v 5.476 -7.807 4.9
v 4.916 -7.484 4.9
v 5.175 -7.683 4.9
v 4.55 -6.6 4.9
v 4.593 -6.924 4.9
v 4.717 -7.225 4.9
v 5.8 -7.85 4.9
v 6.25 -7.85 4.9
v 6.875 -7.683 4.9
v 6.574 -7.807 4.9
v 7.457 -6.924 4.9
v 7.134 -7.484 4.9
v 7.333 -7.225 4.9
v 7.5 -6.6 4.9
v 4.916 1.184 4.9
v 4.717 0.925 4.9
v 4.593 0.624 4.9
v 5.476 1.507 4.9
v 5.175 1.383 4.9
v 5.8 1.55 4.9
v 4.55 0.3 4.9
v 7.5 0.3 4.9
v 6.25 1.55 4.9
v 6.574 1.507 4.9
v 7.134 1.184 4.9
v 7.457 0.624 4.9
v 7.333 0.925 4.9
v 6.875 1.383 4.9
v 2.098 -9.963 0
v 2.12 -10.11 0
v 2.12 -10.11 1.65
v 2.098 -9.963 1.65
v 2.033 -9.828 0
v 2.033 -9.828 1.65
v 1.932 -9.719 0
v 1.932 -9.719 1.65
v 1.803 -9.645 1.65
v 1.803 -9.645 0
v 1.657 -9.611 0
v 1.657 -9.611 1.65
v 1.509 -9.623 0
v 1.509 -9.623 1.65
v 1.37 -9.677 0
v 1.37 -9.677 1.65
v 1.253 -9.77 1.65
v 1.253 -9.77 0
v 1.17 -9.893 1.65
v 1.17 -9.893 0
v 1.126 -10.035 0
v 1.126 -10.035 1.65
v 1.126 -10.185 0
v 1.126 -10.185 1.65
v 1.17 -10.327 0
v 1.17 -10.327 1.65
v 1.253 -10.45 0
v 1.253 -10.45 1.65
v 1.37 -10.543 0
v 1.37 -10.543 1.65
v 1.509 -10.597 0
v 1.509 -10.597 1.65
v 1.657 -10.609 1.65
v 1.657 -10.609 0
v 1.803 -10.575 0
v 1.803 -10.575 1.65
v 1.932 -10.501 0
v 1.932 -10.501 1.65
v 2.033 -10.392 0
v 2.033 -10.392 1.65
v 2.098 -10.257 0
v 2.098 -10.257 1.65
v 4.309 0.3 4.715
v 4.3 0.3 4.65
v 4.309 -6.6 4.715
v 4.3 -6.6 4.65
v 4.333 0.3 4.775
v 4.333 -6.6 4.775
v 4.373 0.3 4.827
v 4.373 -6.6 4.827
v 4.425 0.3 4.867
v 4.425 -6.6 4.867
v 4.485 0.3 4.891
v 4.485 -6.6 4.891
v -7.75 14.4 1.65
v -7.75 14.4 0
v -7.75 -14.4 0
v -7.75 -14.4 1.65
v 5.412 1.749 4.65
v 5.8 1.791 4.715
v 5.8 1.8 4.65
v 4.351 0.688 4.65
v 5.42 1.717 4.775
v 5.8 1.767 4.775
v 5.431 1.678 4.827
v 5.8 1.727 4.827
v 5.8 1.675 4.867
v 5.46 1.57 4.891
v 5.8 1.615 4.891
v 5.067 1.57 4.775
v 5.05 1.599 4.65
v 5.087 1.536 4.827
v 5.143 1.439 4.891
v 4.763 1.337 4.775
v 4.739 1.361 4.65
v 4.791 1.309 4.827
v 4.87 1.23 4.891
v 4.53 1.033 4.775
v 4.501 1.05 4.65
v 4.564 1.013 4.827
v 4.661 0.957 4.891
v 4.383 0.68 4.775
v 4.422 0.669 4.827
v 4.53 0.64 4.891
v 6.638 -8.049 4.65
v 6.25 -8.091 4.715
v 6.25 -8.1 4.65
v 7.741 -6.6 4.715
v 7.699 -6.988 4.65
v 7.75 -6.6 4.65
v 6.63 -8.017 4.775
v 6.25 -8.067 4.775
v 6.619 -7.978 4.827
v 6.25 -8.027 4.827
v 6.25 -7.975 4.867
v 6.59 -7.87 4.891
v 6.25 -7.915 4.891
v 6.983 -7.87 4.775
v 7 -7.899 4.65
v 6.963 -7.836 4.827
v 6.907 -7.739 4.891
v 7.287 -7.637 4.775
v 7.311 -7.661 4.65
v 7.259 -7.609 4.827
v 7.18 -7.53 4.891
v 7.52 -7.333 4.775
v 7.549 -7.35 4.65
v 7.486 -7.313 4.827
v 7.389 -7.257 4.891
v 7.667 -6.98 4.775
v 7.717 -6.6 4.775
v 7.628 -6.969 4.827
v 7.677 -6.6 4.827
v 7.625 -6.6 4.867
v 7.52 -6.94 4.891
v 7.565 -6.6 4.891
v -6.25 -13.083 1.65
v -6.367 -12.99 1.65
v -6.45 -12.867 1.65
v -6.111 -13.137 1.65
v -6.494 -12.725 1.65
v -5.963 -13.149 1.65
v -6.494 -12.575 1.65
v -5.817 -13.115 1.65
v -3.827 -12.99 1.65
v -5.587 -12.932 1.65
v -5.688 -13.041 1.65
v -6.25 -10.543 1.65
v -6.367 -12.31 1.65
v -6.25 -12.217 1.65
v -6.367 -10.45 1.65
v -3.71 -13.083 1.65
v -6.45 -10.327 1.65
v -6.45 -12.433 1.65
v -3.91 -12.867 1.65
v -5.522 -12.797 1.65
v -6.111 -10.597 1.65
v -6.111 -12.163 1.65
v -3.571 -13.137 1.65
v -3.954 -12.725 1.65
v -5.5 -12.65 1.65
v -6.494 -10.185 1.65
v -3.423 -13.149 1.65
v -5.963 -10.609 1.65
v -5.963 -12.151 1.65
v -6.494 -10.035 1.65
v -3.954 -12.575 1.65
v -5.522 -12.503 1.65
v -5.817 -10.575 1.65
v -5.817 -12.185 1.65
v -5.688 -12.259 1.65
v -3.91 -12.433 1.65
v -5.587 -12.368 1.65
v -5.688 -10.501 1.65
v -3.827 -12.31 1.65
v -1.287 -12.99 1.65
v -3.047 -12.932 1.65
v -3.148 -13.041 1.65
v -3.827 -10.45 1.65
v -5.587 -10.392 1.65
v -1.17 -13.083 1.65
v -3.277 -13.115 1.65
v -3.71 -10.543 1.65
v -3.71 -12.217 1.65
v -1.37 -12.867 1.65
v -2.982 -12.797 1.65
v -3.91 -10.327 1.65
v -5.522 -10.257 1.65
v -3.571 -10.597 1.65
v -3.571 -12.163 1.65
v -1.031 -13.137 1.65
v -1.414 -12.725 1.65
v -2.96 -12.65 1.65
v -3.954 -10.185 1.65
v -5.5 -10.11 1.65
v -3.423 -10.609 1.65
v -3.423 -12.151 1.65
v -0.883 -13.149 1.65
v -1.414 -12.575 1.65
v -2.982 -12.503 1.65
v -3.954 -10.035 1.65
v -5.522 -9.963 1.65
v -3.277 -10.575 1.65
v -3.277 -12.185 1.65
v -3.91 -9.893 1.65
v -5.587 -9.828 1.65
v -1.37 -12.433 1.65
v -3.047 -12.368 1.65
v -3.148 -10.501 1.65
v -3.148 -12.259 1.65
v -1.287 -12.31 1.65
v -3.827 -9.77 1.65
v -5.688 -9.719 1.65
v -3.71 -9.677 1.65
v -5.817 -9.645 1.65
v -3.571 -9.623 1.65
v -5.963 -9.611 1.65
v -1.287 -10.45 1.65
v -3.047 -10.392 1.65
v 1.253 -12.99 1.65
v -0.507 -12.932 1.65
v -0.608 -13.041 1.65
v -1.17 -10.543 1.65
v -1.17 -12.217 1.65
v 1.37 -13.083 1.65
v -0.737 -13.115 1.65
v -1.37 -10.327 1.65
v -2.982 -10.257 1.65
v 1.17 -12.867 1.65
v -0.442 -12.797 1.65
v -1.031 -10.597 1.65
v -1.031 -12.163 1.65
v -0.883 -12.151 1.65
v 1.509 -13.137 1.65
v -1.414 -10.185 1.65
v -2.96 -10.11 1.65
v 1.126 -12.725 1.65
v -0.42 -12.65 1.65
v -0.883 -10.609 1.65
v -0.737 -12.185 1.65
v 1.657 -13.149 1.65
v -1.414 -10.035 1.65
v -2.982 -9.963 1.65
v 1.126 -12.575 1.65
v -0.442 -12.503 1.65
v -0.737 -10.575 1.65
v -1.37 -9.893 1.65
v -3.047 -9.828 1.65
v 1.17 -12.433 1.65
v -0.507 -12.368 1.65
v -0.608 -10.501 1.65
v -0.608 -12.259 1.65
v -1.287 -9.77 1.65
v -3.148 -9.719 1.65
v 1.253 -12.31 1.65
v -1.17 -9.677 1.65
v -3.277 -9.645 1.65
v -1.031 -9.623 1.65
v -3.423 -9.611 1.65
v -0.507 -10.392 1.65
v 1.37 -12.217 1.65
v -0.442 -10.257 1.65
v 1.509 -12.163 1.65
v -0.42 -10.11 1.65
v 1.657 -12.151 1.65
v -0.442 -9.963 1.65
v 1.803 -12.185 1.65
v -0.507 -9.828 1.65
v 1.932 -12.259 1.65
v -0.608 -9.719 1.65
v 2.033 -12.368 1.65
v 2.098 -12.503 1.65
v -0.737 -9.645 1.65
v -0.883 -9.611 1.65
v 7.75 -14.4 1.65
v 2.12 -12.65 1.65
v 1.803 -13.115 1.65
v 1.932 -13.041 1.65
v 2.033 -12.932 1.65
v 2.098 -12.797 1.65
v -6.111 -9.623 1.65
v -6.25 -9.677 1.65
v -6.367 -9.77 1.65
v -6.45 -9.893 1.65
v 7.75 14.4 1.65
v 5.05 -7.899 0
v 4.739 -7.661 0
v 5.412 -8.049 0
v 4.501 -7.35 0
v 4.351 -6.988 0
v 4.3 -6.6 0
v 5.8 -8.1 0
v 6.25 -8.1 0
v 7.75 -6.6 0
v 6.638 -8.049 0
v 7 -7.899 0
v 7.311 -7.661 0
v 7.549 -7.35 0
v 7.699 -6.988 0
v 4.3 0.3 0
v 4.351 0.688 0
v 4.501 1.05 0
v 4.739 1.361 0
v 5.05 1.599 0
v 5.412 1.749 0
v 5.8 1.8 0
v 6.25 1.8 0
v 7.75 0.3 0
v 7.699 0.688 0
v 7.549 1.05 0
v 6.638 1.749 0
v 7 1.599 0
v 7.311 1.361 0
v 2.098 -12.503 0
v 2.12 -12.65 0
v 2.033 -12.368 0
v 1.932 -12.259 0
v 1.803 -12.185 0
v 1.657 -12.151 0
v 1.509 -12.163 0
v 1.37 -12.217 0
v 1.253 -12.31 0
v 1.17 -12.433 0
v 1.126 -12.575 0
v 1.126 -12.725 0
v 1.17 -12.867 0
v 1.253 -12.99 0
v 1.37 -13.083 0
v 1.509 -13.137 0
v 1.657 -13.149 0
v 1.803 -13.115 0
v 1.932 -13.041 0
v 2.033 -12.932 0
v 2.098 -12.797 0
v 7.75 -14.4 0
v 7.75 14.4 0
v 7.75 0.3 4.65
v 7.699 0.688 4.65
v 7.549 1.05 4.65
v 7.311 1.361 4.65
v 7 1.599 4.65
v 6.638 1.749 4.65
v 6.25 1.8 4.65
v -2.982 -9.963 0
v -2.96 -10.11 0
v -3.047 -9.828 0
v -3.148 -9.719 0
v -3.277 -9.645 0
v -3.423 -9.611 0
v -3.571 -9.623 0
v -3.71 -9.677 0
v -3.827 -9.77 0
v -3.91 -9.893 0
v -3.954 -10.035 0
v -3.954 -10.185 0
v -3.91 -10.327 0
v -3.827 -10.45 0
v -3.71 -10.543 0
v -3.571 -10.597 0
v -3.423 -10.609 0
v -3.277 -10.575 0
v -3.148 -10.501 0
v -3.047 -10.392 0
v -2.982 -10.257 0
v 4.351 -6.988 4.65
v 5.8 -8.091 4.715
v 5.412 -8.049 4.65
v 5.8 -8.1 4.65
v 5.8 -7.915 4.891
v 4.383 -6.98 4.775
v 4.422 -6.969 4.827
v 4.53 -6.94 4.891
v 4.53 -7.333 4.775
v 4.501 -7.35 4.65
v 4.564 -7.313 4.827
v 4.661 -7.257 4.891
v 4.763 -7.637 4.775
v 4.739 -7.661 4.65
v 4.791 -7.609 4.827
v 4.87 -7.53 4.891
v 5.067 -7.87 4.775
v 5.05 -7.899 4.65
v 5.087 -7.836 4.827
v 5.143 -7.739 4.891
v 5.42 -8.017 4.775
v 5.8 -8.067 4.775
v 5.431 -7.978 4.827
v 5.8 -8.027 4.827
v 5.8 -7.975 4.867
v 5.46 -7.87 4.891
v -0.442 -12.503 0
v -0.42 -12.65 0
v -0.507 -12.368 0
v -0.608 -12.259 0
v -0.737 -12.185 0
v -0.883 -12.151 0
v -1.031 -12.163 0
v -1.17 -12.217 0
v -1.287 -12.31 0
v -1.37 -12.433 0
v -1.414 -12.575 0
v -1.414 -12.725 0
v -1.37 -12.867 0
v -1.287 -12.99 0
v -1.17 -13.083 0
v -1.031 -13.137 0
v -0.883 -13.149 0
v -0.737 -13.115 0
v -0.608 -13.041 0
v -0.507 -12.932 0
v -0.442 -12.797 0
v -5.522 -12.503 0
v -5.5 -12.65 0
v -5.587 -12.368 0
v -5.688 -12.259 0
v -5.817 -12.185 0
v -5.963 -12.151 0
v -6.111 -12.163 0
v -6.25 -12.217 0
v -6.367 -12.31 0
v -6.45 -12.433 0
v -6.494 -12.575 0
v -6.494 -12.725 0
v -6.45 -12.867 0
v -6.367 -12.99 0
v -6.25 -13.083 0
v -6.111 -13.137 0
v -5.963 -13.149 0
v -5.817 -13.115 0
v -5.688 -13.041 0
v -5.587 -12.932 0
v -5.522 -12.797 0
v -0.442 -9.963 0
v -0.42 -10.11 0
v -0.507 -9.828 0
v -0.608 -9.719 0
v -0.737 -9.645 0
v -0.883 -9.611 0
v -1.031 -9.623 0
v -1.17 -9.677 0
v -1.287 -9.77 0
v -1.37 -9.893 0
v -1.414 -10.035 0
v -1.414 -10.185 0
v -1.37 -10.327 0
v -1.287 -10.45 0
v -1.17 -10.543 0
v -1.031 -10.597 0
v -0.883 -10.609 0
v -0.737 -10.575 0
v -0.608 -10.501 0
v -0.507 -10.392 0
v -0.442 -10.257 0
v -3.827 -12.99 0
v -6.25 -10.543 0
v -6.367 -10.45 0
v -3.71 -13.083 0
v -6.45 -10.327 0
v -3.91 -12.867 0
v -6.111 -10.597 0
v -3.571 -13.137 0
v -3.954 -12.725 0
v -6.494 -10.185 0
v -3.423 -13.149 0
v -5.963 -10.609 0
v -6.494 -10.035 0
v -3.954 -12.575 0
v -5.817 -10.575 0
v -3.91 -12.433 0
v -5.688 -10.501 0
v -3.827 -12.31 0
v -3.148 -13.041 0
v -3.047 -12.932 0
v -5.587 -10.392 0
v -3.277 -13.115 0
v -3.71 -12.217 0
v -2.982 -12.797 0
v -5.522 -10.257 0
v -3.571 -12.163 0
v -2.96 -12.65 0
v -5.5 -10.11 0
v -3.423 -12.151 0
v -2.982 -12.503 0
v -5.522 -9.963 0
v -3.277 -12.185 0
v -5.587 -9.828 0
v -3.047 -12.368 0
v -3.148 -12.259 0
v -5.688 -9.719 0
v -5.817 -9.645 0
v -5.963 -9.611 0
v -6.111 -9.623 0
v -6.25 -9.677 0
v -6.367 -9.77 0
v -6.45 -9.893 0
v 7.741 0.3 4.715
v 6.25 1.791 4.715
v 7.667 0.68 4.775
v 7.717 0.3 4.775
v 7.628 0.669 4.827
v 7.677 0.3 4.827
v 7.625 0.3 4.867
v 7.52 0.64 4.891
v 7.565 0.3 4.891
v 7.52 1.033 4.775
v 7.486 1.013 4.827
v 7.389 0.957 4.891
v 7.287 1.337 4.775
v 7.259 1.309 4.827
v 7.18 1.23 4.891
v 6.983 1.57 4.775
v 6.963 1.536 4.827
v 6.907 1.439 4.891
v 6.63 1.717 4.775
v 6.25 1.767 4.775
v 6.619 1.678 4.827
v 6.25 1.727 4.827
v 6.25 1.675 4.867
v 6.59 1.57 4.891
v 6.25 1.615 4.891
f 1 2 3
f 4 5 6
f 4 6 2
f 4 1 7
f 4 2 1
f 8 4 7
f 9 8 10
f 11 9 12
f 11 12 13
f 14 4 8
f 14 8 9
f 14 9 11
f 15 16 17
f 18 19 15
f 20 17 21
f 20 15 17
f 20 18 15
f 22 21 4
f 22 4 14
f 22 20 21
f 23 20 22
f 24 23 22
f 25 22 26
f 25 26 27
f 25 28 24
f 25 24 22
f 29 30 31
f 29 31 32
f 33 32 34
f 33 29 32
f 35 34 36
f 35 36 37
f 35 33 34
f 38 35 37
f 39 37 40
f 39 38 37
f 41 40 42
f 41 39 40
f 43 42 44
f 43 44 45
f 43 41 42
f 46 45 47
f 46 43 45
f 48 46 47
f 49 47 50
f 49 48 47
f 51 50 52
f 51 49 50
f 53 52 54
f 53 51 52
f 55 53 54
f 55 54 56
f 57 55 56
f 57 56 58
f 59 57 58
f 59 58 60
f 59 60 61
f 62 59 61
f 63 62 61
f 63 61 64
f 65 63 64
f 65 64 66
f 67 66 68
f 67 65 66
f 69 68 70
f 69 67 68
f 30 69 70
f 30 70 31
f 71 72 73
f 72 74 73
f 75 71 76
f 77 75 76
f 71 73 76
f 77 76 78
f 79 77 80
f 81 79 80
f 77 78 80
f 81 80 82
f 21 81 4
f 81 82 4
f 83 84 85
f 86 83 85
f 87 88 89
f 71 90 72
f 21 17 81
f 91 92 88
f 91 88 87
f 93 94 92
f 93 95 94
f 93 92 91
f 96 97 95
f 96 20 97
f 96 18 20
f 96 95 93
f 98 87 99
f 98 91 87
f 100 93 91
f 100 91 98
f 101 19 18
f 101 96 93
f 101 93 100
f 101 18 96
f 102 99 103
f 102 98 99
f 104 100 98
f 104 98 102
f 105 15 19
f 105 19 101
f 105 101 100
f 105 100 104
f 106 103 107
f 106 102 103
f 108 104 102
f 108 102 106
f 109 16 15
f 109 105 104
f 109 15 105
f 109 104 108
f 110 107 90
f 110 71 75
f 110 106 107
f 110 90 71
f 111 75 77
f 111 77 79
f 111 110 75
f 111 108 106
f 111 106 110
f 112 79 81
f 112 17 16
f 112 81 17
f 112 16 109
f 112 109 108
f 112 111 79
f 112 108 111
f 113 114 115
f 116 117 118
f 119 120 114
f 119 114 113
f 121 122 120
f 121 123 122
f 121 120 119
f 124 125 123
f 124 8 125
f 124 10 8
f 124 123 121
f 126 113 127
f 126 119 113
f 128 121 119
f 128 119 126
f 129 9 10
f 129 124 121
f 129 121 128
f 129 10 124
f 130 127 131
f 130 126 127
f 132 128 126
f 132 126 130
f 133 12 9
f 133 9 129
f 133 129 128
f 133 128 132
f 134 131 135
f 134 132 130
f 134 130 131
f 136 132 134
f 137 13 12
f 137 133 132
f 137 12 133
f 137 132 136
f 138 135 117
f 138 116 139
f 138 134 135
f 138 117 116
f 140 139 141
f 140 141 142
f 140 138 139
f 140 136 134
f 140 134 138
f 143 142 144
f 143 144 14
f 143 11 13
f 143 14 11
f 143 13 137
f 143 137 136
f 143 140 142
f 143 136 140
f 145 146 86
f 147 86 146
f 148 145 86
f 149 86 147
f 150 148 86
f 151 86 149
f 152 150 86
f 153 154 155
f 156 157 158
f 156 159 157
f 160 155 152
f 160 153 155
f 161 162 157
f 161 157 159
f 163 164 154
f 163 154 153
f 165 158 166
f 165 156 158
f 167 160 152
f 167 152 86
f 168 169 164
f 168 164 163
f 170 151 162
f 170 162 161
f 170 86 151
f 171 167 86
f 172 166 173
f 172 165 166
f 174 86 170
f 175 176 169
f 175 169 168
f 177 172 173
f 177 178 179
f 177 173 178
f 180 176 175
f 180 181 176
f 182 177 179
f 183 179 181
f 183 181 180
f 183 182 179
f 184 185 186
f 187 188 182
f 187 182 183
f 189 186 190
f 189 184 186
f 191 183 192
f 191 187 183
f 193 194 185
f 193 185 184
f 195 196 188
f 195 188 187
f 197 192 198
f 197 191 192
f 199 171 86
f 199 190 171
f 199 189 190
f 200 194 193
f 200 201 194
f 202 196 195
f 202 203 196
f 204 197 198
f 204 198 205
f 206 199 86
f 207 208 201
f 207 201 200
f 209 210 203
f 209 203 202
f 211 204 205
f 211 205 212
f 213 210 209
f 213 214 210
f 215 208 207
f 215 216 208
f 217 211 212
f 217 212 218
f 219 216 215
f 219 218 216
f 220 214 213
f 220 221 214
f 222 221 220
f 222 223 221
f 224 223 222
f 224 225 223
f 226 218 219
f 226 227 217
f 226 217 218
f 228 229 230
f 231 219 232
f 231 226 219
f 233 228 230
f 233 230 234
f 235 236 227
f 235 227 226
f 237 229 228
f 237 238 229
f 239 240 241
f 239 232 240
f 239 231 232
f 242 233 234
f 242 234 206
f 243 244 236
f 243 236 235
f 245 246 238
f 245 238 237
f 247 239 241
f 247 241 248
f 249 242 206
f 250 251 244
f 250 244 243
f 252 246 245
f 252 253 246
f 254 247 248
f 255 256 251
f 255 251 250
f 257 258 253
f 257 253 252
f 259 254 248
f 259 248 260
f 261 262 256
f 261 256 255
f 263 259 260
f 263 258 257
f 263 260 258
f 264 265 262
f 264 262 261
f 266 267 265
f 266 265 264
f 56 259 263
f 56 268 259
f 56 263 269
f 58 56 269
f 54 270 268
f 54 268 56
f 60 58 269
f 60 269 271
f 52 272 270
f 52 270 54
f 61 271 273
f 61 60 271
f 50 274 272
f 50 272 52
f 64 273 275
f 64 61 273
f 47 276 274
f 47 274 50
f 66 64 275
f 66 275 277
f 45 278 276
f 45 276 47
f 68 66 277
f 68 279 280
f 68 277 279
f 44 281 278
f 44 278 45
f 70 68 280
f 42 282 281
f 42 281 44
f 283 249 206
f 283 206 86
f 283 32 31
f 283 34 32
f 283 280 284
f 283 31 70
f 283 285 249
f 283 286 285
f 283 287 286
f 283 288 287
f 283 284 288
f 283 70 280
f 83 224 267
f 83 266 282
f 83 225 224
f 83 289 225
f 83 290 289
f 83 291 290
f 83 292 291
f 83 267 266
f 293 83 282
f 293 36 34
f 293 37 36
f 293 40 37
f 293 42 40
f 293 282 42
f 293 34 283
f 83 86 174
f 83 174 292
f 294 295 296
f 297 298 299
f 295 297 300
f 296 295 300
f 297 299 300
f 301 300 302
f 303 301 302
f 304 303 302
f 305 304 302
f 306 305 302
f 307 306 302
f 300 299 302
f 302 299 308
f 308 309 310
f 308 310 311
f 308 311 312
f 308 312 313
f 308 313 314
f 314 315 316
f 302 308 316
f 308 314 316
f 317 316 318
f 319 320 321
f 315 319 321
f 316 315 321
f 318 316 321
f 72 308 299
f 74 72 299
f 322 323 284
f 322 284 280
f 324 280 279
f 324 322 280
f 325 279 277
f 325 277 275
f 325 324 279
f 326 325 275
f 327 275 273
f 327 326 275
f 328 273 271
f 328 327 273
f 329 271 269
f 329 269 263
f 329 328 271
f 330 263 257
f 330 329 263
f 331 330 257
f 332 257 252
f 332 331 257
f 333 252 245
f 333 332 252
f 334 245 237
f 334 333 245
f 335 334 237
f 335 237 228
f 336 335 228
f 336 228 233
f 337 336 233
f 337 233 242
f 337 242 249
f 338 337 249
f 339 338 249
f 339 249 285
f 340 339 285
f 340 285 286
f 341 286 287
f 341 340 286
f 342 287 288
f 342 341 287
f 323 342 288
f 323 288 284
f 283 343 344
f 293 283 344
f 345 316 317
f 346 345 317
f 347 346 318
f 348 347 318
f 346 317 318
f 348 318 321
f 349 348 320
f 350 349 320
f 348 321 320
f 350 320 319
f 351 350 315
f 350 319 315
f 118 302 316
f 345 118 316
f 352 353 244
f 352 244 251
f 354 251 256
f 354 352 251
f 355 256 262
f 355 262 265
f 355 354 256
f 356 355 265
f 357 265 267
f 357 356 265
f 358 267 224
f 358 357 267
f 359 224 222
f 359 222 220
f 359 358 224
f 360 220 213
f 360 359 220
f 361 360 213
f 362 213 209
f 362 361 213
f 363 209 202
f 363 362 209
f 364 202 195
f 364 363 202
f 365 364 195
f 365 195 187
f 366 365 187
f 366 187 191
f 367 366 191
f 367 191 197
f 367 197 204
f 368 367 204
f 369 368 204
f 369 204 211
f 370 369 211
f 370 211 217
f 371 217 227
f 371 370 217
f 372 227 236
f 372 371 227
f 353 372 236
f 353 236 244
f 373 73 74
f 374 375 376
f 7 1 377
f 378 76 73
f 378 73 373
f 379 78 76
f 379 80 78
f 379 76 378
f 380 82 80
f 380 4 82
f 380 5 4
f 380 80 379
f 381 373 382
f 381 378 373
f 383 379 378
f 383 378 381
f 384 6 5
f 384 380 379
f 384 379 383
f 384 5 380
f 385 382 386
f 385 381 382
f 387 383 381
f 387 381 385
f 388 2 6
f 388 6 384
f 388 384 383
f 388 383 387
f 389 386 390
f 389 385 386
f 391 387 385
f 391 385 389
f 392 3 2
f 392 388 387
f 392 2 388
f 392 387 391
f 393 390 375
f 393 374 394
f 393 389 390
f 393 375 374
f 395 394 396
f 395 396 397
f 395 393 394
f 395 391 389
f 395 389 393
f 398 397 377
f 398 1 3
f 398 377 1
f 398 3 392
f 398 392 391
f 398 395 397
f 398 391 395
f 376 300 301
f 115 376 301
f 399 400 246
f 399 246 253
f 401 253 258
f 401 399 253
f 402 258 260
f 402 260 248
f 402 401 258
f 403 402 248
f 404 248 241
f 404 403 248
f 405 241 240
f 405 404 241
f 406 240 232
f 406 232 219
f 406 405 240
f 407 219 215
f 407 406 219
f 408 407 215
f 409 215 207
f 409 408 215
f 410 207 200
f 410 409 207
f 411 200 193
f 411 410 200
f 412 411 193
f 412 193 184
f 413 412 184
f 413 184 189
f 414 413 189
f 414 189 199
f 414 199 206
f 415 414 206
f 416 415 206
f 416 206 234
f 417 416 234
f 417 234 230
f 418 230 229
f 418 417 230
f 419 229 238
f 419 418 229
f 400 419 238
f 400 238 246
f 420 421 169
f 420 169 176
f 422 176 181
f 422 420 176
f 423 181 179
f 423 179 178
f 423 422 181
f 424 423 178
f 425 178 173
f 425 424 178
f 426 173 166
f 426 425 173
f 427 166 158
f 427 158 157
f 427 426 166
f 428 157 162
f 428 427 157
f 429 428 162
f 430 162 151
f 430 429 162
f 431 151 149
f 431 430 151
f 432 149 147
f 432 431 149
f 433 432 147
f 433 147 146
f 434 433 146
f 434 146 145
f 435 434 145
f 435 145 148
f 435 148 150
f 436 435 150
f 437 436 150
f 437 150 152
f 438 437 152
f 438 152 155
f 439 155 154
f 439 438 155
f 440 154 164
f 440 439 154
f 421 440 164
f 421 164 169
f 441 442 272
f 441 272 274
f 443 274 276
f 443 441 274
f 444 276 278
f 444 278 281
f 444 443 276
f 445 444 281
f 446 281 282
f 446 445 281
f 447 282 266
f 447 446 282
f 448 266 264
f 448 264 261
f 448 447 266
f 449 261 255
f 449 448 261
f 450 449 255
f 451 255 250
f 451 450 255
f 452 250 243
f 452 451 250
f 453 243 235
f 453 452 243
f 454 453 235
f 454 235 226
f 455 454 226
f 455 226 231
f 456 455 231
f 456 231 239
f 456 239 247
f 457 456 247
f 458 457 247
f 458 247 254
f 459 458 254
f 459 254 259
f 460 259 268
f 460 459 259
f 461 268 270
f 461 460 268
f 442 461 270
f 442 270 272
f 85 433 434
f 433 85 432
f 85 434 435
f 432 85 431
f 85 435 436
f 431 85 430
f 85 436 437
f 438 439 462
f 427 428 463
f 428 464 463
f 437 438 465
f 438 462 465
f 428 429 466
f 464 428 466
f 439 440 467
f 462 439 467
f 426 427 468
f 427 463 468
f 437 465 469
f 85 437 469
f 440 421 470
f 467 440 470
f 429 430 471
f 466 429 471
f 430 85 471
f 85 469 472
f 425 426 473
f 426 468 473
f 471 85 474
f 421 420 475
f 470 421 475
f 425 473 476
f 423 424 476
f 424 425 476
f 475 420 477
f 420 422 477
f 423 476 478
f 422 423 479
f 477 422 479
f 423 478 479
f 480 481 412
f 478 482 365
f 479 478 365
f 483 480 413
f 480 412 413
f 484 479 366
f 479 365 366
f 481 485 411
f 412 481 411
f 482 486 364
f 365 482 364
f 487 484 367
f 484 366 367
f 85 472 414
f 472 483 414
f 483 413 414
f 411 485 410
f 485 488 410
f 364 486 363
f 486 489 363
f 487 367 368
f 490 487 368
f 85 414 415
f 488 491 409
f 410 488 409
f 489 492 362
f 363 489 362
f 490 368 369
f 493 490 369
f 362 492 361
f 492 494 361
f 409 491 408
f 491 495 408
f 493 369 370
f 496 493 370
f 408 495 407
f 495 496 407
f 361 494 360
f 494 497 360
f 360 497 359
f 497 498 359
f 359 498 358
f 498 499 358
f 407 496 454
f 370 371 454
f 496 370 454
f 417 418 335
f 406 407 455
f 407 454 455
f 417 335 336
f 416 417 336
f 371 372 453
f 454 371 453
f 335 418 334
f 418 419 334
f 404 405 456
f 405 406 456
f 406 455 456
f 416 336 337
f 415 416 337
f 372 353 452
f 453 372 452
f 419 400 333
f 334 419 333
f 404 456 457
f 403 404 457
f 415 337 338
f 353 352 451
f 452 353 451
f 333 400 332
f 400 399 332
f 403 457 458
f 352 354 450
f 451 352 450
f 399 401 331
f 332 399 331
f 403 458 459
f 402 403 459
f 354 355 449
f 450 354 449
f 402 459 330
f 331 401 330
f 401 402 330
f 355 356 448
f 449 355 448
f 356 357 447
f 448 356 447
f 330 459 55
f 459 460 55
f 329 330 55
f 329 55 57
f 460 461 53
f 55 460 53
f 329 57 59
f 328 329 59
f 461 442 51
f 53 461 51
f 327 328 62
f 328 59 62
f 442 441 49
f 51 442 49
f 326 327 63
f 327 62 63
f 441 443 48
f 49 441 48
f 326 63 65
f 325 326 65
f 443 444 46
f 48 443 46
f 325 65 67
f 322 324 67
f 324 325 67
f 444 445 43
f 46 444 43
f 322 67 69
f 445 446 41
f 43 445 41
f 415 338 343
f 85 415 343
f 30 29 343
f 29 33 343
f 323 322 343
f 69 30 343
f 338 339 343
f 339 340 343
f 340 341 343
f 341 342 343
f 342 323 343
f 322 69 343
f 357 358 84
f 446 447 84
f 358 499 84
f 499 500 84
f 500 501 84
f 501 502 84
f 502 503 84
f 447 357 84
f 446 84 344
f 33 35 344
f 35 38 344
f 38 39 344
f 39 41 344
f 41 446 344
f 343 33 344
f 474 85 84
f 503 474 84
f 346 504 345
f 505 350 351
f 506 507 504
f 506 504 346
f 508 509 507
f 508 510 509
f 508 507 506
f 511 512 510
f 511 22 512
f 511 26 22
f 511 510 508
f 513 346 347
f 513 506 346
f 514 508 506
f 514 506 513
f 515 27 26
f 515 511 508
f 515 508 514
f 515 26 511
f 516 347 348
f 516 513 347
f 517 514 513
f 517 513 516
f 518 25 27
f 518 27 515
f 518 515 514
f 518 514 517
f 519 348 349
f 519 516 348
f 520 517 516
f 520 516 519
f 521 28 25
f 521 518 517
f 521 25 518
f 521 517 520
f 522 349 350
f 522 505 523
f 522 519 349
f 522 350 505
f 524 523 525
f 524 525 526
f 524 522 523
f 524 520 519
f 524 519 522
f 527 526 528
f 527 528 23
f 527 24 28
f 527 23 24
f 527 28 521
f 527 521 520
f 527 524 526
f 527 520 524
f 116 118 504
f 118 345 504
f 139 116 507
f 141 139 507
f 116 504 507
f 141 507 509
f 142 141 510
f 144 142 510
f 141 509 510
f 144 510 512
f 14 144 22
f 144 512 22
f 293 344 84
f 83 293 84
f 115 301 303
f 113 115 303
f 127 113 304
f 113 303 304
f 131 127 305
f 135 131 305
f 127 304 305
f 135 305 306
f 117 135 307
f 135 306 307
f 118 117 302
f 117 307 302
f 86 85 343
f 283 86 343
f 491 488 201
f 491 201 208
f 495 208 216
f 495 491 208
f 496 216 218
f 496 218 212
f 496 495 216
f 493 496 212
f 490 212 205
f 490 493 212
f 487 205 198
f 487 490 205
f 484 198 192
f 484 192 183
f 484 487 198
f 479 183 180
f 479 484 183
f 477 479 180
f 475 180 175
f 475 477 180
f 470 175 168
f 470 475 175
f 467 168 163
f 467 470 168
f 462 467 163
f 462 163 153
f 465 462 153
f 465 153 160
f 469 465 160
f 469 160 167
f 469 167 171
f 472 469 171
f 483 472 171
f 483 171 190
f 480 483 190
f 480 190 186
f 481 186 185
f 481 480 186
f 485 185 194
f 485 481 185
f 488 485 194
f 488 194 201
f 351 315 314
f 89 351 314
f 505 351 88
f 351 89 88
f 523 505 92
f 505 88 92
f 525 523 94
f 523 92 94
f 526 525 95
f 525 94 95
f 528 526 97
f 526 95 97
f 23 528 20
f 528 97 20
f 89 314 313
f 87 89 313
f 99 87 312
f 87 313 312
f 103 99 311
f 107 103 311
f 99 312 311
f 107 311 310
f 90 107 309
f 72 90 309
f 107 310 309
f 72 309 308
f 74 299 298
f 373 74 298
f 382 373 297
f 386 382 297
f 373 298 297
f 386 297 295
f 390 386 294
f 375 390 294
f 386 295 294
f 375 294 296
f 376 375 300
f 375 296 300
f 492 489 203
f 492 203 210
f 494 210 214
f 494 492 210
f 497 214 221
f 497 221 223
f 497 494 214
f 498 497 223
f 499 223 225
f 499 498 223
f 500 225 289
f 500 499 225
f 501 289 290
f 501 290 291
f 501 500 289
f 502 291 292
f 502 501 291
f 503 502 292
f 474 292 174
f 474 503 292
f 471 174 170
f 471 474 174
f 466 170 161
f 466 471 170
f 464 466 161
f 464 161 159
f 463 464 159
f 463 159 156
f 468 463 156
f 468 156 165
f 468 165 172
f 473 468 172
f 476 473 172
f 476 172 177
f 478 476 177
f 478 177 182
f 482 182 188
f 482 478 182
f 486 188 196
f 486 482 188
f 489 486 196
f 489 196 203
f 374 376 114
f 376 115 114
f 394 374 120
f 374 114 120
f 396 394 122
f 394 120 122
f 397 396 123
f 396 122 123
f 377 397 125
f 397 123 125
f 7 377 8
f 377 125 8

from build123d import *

# Parameters (mm, degrees)
F0_R     = 0.5
F1_DEPTH = 1.65
F2_DEPTH = 4.9
F3_R     = 0.25


with BuildPart() as f1:
    # F0 (on Top) → F1 (new body)
    with BuildSketch(Plane.XY):
        with BuildLine():
            Line((7.75, 0.3), (7.75, 14.4))
            Line((7.75, 14.4), (-7.75, 14.4))
            Line((-7.75, 14.4), (-7.75, -14.4))
            Line((-7.75, -14.4), (7.75, -14.4))
            Line((7.75, -14.4), (7.75, -6.6))
            ThreePointArc((7.75, -6.6), (7.31066, -7.66066), (6.25, -8.1))
            Line((6.25, -8.1), (5.8, -8.1))
            ThreePointArc((5.8, -8.1), (4.73934, -7.66066), (4.3, -6.6))
            Line((4.3, -6.6), (4.3, 0.3))
            ThreePointArc((4.3, 0.3), (4.73934, 1.36066), (5.8, 1.8))
            Line((5.8, 1.8), (6.25, 1.8))
            ThreePointArc((6.25, 1.8), (7.31066, 1.36066), (7.75, 0.3))
        make_face()
        with Locations((-6, -12.65)):
            Circle(F0_R, mode=Mode.SUBTRACT)
        with Locations((-6, -10.11)):
            Circle(F0_R, mode=Mode.SUBTRACT)
        with Locations((-3.46, -12.65)):
            Circle(F0_R, mode=Mode.SUBTRACT)
        with Locations((-0.92, -12.65)):
            Circle(F0_R, mode=Mode.SUBTRACT)
        with Locations((-3.46, -10.11)):
            Circle(F0_R, mode=Mode.SUBTRACT)
        with Locations((-0.92, -10.11)):
            Circle(F0_R, mode=Mode.SUBTRACT)
        with Locations((1.62, -12.65)):
            Circle(F0_R, mode=Mode.SUBTRACT)
        with Locations((1.62, -10.11)):
            Circle(F0_R, mode=Mode.SUBTRACT)
        with BuildLine():
            Line((7.75, -6.6), (7.75, 0.3))
            ThreePointArc((7.75, 0.3), (7.31066, 1.36066), (6.25, 1.8))
            Line((6.25, 1.8), (5.8, 1.8))
            ThreePointArc((5.8, 1.8), (4.73934, 1.36066), (4.3, 0.3))
            Line((4.3, 0.3), (4.3, -6.6))
            ThreePointArc((4.3, -6.6), (4.73934, -7.66066), (5.8, -8.1))
            Line((5.8, -8.1), (6.25, -8.1))
            ThreePointArc((6.25, -8.1), (7.31066, -7.66066), (7.75, -6.6))
        make_face()
    extrude(amount=F1_DEPTH)


with BuildPart() as f2:
    # F0 (on Top) → F2 (new body)
    with BuildSketch(Plane.XY):
        with BuildLine():
            Line((7.75, -6.6), (7.75, 0.3))
            ThreePointArc((7.75, 0.3), (7.31066, 1.36066), (6.25, 1.8))
            Line((6.25, 1.8), (5.8, 1.8))
            ThreePointArc((5.8, 1.8), (4.73934, 1.36066), (4.3, 0.3))
            Line((4.3, 0.3), (4.3, -6.6))
            ThreePointArc((4.3, -6.6), (4.73934, -7.66066), (5.8, -8.1))
            Line((5.8, -8.1), (6.25, -8.1))
            ThreePointArc((6.25, -8.1), (7.31066, -7.66066), (7.75, -6.6))
        make_face()
    extrude(amount=F2_DEPTH)

    # F3
    f3_edges = [f2.edges().sort_by_distance(p)[0] for p in [
        (7.75, -3.15, 4.9),
        (7.31066, 1.36066, 4.9),
        (6.025, 1.8, 4.9),
        (4.73934, 1.36066, 4.9),
        (4.3, -3.15, 4.9),
        (4.73934, -7.66066, 4.9),
        (6.025, -8.1, 4.9),
        (7.31066, -7.66066, 4.9),
    ]]
    fillet(f3_edges, radius=F3_R)


solid = Compound([f1.part, f2.part])
